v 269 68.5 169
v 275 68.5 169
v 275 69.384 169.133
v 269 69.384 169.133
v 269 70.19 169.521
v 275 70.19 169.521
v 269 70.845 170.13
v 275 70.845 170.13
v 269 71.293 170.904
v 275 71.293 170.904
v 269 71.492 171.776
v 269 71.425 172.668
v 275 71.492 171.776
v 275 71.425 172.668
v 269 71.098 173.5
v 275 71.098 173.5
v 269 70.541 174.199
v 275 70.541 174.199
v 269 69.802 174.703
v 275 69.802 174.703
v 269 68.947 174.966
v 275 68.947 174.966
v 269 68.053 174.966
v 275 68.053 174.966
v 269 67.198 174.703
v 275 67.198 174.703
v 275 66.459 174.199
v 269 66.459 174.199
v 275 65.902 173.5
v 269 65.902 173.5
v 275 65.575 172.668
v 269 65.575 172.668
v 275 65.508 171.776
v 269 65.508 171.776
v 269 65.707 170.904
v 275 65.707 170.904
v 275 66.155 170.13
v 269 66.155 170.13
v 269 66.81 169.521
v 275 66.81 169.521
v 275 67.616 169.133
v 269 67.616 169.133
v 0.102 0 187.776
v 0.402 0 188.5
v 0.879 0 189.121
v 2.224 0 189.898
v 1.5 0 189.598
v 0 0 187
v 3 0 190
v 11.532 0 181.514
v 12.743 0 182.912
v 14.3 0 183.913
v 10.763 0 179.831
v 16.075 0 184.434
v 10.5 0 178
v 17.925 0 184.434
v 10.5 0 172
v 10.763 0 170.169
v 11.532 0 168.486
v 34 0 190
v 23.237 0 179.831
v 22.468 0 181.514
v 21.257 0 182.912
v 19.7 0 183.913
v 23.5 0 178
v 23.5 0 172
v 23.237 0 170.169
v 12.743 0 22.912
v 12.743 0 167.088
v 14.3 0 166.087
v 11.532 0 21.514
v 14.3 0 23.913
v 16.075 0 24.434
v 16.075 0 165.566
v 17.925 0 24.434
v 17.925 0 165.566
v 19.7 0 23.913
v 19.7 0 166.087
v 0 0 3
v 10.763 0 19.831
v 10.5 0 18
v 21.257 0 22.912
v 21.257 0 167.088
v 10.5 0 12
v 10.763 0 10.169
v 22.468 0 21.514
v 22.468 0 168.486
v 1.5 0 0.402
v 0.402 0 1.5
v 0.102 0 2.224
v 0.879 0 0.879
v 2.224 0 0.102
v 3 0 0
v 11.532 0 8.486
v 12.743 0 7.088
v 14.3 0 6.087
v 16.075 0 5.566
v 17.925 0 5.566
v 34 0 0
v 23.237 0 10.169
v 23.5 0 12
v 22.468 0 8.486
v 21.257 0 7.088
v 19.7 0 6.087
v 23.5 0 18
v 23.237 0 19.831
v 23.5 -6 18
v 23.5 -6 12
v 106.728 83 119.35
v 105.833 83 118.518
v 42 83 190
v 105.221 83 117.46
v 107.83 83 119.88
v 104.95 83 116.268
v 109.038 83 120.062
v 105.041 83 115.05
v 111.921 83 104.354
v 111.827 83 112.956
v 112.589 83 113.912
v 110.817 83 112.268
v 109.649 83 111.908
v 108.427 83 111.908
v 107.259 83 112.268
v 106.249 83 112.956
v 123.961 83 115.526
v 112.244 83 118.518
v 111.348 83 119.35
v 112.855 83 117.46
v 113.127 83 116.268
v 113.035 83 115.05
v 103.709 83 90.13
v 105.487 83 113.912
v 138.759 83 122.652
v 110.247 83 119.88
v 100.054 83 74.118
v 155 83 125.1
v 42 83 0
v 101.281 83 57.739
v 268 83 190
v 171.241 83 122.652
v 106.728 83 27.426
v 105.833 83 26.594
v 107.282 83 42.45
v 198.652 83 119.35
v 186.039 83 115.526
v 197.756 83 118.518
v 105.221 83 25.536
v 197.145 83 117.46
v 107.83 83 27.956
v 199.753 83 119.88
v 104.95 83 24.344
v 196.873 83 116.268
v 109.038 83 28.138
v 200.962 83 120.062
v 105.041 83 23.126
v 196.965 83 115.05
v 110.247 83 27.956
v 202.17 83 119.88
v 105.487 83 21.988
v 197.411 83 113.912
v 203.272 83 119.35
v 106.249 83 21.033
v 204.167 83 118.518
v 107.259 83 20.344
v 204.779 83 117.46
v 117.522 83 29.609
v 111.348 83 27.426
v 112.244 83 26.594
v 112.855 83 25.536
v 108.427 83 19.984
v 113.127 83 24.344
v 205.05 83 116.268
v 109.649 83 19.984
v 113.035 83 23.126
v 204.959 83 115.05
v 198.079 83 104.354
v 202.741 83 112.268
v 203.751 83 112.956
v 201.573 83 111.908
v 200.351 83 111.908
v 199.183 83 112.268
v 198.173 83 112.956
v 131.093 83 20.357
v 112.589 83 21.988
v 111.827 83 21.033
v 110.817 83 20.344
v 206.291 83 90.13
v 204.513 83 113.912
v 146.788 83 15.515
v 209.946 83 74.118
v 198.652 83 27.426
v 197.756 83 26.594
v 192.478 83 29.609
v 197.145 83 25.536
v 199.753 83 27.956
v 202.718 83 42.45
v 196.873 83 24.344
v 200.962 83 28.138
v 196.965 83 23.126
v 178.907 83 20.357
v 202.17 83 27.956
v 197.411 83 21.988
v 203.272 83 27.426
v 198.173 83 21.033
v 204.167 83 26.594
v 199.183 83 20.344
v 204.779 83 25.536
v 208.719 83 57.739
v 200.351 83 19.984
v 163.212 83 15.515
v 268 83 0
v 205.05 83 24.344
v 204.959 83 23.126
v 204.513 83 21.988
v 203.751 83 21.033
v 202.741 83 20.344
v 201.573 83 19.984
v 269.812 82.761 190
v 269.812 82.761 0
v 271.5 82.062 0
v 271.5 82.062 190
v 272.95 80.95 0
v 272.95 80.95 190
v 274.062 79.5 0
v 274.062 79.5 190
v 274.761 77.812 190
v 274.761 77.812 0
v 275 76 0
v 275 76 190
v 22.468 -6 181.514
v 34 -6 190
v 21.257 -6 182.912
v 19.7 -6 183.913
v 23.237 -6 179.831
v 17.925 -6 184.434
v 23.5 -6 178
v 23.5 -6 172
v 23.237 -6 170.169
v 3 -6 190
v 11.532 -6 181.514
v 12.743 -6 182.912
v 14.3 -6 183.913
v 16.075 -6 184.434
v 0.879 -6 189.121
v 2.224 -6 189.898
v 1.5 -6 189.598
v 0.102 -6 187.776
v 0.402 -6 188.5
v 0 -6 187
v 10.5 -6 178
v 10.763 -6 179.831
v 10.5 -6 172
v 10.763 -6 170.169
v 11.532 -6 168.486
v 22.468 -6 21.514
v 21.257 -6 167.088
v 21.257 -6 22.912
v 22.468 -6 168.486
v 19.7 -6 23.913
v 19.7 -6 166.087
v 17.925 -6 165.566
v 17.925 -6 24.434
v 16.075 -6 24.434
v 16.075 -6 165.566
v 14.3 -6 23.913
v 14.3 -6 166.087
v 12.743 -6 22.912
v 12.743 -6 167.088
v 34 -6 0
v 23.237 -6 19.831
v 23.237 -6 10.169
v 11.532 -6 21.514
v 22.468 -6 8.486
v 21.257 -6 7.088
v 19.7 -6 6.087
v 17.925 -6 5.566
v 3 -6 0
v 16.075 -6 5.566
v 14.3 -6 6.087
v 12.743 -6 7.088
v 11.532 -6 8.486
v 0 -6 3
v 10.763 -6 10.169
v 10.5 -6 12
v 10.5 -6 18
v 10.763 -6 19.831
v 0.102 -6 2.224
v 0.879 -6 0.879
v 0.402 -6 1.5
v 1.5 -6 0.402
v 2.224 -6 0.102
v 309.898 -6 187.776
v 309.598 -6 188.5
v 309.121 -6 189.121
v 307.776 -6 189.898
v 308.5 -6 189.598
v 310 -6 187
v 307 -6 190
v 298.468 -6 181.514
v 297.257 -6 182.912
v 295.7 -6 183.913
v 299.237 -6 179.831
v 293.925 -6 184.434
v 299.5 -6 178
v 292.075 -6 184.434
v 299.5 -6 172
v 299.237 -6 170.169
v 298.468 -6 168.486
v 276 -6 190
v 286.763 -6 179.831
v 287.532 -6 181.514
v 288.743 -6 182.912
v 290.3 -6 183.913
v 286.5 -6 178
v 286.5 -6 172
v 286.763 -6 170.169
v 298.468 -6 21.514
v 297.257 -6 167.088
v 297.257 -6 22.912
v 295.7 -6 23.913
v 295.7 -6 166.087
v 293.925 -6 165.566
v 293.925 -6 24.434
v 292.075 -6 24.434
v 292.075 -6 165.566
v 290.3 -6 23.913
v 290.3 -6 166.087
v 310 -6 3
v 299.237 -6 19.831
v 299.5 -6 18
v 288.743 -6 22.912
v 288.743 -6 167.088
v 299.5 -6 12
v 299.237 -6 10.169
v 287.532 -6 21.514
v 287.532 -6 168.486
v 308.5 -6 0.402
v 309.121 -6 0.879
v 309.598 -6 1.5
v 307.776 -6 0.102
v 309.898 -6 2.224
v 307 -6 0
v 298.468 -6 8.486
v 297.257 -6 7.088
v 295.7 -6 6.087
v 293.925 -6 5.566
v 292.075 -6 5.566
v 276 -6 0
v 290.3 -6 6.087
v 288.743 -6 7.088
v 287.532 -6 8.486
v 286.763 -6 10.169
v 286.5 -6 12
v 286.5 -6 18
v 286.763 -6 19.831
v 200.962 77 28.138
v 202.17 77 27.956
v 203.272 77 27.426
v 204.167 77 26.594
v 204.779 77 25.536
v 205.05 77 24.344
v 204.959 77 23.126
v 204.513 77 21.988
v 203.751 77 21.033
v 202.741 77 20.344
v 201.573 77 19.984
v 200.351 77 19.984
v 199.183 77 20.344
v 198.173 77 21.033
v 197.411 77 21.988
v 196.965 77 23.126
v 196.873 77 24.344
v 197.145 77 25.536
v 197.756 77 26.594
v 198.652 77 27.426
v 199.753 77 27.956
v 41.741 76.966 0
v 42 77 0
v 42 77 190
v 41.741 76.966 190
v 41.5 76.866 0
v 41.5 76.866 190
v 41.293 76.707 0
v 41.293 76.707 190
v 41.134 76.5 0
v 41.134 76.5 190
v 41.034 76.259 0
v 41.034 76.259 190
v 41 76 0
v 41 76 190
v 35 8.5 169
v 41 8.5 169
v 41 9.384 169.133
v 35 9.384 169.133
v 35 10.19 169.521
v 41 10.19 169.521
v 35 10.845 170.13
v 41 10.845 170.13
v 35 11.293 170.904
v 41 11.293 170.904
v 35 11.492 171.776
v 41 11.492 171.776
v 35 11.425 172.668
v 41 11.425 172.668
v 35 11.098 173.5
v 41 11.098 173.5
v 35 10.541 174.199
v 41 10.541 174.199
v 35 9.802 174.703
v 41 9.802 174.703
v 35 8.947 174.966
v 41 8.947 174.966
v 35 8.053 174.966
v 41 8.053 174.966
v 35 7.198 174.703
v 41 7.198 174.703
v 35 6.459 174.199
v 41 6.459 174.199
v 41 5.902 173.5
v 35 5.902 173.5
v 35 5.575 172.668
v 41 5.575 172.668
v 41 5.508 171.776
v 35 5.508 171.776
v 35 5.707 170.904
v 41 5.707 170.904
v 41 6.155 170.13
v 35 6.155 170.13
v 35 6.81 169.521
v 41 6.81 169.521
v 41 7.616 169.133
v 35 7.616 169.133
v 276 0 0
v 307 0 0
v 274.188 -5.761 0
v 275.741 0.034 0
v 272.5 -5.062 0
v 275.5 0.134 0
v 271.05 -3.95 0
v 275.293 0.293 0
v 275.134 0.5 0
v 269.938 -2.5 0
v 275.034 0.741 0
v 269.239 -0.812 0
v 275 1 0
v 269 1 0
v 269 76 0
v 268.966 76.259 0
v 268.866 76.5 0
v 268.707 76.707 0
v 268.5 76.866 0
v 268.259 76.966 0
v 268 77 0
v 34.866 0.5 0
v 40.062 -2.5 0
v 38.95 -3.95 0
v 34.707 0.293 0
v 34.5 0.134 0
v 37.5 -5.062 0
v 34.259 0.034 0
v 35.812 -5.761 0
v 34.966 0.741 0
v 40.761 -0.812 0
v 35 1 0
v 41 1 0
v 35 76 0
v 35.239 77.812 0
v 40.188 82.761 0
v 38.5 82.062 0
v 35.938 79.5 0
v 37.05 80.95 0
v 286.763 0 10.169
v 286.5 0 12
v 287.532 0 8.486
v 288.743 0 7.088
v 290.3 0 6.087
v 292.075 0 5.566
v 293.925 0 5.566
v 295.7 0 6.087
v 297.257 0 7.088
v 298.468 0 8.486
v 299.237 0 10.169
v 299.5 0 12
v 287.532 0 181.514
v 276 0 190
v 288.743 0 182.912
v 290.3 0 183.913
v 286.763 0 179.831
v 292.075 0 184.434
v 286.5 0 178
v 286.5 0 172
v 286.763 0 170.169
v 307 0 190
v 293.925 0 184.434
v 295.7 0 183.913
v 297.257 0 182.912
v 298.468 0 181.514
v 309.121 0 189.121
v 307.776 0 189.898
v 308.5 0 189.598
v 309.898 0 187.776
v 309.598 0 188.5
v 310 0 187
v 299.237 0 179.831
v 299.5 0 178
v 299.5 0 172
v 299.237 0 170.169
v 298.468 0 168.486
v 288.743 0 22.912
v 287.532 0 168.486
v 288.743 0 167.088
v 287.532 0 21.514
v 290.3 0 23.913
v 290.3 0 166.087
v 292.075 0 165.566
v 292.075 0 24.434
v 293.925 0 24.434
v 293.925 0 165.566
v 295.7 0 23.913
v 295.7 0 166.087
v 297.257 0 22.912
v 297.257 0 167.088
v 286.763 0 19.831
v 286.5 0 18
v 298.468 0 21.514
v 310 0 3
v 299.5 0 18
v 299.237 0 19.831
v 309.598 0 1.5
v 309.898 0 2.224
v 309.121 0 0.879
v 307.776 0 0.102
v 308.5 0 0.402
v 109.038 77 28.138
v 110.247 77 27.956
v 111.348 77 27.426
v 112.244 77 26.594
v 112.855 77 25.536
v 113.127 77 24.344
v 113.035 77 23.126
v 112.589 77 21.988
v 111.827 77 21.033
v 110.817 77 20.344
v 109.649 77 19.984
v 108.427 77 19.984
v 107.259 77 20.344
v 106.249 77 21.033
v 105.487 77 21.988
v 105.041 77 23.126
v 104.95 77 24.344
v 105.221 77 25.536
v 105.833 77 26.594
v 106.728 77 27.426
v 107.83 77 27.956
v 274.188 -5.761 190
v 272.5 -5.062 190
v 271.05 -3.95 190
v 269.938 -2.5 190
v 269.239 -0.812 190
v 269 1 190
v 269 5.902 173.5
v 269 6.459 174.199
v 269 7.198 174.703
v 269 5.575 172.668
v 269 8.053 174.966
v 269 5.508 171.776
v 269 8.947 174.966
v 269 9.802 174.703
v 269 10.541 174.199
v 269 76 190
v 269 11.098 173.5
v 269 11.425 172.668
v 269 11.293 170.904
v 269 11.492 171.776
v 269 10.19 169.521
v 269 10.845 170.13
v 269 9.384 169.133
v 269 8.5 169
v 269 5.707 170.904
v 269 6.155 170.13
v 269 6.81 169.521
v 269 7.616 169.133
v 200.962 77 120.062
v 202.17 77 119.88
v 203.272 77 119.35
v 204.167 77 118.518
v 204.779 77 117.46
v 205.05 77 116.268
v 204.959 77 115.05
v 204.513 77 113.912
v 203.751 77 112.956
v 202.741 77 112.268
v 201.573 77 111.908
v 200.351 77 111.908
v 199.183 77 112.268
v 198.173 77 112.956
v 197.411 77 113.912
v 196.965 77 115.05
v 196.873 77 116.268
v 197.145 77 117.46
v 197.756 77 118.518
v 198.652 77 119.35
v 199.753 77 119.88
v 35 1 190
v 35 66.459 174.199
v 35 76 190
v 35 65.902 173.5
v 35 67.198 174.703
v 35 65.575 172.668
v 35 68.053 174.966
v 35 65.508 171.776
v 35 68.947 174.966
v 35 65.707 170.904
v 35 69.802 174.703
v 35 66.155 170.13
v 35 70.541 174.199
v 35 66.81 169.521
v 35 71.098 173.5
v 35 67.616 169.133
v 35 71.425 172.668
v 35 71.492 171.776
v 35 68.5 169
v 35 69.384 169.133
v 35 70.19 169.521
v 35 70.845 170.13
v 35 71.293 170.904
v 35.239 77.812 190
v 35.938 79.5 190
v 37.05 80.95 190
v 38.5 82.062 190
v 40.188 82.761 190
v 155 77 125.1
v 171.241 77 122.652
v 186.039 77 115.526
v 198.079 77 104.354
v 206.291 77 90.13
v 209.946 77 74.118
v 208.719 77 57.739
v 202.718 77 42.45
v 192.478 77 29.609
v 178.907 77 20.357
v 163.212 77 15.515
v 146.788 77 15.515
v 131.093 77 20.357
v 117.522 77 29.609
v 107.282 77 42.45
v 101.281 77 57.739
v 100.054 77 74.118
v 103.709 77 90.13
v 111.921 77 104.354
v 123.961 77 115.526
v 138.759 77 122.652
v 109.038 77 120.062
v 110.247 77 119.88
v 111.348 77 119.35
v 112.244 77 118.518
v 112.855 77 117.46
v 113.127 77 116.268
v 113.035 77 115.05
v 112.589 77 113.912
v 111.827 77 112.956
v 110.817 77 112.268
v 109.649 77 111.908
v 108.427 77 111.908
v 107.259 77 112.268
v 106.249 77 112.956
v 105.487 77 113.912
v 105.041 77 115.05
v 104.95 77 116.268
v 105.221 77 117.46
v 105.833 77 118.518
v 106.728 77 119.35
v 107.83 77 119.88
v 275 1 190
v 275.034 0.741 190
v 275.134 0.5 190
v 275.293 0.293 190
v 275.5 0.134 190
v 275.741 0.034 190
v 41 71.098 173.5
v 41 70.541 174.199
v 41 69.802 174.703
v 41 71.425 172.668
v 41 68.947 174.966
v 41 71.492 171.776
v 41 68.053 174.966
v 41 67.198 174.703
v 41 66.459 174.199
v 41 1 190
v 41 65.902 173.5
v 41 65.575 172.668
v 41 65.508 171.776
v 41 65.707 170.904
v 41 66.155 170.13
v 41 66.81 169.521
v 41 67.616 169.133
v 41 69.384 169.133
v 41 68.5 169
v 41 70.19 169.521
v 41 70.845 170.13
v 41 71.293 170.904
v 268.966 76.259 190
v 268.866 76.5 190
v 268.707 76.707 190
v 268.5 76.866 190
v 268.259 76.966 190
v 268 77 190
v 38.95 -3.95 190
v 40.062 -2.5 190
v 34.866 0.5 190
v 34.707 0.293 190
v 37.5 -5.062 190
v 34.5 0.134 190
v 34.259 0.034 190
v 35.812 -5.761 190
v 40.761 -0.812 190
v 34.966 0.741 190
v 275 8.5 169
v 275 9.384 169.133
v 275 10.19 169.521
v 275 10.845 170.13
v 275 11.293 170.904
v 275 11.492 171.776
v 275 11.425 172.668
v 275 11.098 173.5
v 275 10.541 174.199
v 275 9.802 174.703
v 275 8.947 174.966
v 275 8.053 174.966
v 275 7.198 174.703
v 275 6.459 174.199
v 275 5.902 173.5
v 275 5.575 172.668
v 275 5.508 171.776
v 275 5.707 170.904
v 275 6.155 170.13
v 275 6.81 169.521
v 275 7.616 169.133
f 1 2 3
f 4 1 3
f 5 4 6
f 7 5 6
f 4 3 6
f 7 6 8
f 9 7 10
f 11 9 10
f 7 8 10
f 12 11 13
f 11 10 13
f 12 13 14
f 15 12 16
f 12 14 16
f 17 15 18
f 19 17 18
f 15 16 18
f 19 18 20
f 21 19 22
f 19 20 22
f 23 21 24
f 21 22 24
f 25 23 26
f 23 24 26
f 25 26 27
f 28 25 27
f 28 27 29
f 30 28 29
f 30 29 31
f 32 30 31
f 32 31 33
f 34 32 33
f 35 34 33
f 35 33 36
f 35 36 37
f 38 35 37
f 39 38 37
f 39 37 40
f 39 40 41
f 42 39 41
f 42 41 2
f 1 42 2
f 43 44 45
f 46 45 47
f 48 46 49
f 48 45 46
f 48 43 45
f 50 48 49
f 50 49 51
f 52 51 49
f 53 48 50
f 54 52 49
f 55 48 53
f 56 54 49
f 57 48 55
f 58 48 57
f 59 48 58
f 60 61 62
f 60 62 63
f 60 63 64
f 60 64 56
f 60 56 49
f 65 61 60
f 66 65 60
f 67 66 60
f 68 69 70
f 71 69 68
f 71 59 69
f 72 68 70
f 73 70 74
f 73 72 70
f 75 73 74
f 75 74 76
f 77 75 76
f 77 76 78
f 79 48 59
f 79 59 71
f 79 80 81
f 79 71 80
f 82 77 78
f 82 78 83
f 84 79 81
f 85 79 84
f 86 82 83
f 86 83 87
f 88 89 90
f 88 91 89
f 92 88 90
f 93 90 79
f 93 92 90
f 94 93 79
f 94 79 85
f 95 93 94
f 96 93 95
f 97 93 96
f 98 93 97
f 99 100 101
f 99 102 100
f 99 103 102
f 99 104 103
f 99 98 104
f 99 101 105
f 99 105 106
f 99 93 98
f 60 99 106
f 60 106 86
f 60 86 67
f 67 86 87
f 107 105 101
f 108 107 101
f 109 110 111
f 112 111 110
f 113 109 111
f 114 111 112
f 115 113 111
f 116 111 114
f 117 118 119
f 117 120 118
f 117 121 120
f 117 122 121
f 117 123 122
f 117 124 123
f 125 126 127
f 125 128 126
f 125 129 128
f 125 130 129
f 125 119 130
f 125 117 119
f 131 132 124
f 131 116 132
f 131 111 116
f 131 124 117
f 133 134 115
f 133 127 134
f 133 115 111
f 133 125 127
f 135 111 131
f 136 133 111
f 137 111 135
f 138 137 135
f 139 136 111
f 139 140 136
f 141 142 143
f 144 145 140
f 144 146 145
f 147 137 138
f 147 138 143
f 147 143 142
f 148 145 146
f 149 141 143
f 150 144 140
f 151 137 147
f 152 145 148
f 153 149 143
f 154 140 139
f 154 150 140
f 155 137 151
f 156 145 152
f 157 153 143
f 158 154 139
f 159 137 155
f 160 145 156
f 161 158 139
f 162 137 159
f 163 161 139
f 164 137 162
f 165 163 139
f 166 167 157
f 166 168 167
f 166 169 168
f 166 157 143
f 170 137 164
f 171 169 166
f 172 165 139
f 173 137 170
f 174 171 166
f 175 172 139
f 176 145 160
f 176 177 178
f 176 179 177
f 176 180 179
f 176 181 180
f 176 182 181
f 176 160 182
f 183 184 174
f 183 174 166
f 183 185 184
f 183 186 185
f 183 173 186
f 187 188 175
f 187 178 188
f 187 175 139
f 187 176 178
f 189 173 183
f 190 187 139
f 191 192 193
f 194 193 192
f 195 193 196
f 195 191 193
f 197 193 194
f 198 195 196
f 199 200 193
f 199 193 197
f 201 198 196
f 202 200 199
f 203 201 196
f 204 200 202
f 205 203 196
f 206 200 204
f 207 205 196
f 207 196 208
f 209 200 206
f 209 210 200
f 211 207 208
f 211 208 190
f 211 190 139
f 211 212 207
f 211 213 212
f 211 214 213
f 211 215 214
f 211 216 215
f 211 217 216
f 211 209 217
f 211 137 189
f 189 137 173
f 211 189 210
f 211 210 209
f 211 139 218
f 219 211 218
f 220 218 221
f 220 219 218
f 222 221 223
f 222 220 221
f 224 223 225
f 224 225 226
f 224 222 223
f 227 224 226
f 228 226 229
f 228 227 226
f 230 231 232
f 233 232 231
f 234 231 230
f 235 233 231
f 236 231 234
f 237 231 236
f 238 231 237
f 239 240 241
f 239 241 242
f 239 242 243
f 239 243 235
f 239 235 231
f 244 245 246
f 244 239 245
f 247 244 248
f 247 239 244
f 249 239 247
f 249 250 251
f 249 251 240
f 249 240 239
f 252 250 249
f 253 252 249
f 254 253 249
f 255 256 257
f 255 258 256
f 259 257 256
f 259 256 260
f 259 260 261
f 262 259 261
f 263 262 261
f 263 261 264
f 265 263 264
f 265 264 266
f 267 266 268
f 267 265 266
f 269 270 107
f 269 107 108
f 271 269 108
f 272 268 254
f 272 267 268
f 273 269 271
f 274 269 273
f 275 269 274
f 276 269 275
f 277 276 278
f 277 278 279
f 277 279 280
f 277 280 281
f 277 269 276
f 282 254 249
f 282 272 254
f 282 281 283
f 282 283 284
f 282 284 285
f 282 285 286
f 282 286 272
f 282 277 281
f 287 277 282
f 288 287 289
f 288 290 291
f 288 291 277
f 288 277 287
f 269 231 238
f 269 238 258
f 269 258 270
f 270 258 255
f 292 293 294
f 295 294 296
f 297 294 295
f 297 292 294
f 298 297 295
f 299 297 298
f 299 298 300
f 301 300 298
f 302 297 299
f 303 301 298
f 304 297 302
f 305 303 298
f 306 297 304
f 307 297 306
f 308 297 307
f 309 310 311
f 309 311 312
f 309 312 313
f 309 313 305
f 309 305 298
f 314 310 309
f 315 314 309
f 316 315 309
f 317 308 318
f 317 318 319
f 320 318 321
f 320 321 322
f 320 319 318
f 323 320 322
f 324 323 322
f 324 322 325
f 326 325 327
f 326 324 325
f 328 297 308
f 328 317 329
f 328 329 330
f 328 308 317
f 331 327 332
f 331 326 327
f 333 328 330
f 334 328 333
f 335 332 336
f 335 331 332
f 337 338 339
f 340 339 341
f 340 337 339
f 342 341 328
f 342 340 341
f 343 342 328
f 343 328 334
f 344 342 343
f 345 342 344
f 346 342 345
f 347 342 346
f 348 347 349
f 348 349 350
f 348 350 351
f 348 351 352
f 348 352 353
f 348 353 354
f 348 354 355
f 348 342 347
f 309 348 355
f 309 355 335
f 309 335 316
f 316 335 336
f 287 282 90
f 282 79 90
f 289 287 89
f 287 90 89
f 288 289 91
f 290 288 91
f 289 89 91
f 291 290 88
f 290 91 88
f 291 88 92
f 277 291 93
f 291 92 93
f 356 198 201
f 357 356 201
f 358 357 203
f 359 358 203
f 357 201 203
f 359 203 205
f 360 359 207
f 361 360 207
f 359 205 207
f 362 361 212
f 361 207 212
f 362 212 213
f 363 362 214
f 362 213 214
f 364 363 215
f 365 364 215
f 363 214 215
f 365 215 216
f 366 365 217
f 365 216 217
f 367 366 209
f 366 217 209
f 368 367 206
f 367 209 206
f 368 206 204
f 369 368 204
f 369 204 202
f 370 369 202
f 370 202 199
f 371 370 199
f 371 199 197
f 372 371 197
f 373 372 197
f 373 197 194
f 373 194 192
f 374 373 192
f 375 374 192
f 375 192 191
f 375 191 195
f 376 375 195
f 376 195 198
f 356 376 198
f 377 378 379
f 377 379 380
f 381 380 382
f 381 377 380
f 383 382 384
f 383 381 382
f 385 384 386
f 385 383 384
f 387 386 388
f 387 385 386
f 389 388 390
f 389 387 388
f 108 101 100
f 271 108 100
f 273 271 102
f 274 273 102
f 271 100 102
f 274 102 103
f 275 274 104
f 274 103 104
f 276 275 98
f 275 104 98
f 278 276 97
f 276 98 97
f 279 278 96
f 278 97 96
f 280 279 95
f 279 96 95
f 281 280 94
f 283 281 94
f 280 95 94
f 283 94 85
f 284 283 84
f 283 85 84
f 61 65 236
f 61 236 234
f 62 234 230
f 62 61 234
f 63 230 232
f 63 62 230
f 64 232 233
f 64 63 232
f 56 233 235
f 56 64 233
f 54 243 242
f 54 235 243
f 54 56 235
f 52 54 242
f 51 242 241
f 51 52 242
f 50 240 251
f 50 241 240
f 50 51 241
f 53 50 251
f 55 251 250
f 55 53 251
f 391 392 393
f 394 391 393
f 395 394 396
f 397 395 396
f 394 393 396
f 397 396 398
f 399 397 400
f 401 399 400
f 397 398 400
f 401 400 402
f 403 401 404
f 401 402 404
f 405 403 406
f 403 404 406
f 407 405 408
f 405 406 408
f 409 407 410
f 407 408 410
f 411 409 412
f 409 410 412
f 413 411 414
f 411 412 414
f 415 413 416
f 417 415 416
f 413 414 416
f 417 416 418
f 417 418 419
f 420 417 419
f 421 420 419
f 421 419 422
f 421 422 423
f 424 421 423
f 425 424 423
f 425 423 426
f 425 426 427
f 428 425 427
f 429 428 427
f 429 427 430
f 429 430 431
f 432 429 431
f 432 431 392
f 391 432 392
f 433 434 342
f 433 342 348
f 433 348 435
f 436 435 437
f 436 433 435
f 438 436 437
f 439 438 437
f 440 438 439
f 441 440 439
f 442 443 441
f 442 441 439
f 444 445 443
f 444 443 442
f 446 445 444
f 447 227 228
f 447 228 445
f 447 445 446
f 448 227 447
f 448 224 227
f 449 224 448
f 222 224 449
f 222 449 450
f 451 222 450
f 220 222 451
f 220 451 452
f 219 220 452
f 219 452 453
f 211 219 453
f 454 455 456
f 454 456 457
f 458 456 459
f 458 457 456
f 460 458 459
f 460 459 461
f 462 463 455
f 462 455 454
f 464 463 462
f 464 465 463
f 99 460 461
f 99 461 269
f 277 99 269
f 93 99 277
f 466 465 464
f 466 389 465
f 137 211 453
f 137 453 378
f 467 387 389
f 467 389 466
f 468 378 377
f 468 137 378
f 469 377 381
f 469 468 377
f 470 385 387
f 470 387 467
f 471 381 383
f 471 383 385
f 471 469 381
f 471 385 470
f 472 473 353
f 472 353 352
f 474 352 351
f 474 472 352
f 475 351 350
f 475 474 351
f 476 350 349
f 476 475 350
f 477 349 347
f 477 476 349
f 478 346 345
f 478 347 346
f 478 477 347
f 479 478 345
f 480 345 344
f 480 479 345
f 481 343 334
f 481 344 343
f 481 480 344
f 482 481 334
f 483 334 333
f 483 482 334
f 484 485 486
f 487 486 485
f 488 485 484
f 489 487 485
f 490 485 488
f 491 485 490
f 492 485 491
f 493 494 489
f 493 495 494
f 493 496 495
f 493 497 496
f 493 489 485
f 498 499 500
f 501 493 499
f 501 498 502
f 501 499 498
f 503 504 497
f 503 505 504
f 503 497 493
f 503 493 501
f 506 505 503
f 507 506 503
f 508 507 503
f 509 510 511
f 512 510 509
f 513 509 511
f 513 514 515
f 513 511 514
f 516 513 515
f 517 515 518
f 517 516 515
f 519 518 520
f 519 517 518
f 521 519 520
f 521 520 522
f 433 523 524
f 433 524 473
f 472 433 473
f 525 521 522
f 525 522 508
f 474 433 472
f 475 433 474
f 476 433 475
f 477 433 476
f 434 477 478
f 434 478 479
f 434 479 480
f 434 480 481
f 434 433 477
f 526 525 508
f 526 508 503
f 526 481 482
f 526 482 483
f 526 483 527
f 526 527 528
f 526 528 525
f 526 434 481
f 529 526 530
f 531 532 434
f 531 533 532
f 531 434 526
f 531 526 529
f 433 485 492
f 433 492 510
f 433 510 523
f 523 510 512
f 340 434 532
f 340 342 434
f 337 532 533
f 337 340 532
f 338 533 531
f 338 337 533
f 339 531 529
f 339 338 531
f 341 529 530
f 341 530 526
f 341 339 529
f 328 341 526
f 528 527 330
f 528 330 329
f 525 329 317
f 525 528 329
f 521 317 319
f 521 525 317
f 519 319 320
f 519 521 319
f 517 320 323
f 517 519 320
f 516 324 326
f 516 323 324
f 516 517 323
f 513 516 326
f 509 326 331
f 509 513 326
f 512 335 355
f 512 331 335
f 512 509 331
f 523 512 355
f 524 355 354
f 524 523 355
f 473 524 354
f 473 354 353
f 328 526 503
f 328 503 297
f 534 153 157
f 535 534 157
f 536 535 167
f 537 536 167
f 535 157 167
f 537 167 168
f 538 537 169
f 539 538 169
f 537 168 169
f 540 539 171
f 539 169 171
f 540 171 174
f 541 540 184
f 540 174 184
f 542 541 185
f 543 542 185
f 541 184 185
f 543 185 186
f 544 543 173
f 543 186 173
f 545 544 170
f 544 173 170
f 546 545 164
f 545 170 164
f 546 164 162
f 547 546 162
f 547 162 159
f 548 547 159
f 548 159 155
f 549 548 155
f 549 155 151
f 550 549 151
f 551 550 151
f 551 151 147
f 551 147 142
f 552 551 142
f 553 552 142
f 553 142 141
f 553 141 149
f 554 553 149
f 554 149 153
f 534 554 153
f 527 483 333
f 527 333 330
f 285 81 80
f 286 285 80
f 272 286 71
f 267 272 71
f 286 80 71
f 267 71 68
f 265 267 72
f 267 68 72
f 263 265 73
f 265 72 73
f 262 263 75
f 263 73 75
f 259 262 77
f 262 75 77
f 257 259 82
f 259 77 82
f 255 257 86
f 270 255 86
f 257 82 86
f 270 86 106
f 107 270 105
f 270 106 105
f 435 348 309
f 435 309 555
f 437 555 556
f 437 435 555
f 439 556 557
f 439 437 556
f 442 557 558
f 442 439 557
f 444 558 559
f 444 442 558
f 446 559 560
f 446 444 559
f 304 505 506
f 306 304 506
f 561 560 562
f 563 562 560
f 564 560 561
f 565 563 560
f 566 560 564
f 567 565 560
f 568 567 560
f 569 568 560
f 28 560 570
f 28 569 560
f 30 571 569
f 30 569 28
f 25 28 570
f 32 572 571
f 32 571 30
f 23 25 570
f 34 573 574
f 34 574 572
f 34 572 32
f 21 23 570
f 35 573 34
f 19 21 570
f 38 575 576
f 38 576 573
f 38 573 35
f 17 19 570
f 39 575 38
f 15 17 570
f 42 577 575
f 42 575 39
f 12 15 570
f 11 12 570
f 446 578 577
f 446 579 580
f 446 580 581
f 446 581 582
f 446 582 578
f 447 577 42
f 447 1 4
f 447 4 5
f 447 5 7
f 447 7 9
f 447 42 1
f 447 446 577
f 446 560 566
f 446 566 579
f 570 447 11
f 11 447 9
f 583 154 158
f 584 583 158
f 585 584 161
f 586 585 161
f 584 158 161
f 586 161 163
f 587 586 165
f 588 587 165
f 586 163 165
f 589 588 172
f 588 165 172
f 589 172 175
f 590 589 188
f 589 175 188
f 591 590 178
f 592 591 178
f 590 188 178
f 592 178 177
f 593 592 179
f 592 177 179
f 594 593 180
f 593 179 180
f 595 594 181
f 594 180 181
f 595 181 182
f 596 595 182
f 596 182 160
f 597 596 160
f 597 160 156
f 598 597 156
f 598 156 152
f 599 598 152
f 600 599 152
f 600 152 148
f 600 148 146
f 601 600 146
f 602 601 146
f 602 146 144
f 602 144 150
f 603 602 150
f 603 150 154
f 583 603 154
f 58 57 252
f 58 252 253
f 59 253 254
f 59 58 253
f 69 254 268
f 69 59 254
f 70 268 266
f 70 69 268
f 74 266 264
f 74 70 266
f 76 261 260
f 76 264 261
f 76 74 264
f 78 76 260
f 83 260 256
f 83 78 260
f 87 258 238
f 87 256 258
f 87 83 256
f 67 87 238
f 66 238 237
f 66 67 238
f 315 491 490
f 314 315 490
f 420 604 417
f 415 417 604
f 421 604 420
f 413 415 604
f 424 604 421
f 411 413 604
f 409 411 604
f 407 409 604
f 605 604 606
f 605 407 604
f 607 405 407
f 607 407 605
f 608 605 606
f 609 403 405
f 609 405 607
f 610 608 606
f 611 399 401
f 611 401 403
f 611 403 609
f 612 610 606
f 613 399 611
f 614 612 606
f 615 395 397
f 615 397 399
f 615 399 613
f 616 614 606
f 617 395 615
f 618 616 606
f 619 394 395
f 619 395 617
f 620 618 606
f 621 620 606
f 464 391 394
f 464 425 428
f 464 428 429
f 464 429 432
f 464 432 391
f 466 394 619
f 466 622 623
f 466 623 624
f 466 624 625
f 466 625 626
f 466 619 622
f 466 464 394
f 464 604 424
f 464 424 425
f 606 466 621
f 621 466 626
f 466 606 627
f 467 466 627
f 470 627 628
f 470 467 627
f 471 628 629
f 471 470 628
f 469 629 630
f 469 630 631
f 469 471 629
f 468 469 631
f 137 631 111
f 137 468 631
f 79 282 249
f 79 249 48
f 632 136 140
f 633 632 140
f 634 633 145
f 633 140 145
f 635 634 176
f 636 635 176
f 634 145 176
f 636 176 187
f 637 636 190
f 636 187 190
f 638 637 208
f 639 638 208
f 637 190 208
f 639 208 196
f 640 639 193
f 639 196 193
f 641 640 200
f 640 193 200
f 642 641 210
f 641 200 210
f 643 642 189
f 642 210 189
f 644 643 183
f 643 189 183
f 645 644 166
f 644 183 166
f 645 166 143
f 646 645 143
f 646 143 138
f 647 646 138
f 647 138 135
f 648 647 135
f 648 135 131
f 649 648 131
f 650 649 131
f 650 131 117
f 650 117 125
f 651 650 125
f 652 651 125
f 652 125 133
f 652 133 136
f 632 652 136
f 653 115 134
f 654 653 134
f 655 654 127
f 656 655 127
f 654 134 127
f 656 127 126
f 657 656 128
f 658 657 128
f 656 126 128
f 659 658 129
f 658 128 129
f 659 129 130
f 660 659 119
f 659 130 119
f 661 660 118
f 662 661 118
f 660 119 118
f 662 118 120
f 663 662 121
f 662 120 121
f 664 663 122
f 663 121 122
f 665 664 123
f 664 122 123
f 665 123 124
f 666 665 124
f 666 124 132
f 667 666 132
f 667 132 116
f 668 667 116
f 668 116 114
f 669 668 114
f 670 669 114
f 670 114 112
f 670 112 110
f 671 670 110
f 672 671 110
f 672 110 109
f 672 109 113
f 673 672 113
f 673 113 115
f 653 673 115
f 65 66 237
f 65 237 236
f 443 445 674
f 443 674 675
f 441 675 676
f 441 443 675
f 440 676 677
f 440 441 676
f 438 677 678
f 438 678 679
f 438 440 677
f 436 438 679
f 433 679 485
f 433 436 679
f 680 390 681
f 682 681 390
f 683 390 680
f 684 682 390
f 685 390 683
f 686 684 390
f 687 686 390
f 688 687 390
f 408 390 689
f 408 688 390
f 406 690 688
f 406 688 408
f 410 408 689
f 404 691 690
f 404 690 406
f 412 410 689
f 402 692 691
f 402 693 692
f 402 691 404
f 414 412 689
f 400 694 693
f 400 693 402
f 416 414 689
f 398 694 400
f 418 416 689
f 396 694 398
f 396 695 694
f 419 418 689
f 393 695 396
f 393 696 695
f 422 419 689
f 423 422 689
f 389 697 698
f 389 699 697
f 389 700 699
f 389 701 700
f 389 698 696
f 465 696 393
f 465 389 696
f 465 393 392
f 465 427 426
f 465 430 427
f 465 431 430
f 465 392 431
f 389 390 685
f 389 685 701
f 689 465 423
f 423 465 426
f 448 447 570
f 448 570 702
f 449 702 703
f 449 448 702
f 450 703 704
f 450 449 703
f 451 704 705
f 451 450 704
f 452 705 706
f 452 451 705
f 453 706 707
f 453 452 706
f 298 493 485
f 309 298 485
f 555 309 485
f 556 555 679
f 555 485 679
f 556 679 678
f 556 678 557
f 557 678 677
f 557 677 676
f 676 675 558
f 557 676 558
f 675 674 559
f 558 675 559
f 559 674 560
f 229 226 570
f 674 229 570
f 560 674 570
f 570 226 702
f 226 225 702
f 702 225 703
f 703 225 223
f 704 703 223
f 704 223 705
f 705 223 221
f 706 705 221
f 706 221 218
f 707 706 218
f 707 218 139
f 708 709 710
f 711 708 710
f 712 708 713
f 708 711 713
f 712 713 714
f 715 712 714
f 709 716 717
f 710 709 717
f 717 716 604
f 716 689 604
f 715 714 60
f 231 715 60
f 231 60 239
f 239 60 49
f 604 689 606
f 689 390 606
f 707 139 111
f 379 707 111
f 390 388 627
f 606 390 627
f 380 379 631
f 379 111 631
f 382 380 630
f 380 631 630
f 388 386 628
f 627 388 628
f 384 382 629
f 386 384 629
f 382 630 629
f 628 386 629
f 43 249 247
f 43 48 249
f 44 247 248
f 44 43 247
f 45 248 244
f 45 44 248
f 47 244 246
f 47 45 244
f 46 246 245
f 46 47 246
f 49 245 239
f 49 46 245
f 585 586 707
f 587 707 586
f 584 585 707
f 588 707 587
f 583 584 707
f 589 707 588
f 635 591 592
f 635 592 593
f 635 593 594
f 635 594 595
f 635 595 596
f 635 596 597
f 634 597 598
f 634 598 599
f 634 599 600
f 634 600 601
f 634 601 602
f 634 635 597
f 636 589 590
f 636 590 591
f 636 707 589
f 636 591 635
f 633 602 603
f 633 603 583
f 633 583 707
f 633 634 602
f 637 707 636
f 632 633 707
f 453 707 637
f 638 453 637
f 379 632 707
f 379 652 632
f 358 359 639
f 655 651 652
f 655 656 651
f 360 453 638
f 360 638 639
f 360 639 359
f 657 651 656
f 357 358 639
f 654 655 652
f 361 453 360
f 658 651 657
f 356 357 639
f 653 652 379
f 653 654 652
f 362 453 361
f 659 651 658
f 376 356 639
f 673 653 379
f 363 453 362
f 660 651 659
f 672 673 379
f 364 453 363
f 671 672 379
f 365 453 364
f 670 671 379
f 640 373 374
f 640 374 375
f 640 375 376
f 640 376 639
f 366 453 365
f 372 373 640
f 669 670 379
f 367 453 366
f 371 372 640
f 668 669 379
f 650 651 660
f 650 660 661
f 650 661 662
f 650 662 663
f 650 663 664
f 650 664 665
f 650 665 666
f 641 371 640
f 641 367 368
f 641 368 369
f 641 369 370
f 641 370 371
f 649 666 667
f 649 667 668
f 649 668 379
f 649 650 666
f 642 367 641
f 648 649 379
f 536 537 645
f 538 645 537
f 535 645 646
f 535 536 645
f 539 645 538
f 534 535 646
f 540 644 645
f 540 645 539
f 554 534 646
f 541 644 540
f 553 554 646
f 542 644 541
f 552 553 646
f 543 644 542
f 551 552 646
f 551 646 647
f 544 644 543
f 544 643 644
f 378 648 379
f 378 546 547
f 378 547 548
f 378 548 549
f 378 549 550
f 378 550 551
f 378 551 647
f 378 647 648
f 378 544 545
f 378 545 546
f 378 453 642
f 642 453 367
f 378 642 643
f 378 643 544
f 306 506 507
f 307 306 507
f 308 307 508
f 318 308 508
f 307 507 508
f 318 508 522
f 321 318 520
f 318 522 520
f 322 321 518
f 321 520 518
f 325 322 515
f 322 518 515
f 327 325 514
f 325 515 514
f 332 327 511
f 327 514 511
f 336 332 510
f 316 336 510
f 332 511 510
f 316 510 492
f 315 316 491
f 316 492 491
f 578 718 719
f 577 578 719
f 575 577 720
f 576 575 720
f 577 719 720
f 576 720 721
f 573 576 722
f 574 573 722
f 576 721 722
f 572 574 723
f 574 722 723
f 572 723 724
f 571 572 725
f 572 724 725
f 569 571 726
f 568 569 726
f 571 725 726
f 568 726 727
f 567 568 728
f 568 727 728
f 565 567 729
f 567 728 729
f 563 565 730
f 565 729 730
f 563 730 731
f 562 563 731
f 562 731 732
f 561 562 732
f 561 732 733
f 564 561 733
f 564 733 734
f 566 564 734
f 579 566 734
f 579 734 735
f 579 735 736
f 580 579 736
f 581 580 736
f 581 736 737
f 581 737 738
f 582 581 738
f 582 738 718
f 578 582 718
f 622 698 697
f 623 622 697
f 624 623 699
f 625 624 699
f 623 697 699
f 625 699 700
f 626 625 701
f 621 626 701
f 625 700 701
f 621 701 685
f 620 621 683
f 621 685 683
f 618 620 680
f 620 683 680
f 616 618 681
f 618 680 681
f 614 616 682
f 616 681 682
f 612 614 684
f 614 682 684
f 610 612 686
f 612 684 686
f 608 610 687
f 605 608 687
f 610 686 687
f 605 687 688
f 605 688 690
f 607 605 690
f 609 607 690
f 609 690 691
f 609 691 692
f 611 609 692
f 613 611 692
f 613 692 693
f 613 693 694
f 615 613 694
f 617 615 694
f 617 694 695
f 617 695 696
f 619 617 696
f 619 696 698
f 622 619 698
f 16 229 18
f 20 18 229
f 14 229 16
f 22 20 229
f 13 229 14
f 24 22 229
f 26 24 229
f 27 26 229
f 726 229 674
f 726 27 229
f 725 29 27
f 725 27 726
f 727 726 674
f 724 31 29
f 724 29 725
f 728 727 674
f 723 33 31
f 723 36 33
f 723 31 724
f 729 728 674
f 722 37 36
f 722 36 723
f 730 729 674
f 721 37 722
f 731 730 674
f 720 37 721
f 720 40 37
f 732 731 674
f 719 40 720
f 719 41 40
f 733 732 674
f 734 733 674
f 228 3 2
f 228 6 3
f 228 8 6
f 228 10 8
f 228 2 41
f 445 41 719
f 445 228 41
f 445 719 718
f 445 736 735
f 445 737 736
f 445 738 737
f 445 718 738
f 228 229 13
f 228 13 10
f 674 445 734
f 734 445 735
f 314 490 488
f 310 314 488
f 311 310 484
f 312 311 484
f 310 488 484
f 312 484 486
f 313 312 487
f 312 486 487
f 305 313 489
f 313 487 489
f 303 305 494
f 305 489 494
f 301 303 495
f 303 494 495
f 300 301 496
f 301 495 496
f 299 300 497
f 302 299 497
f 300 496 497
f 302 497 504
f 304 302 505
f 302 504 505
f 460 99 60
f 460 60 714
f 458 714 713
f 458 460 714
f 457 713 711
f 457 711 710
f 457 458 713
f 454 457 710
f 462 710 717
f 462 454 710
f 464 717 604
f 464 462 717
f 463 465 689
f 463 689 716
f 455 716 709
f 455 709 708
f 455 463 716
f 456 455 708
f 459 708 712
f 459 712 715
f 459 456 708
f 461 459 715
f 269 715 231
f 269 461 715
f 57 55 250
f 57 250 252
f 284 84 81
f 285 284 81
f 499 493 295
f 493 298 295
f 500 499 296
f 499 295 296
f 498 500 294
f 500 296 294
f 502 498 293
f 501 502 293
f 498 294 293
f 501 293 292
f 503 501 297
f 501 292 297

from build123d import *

# Parameters (mm, degrees)
BASE_FLANGE1_DEPTH = 190
CUT_EXTRUDE1_REACH = 376.327
SKETCH6_R          = 55.1
SKETCH6_R_2        = 4.1
CUT_EXTRUDE2_REACH = 374.946
FILLET1_R          = 3
CUT_EXTRUDE3_REACH = 346.404
SKETCH8_R          = 3


# Sheet-metal steps are written as plain solids
with BuildPart() as part:
    # Sketch1 → Base-Flange1 (new body)
    with BuildSketch(Plane.XY):
        with BuildLine():
            Line((0, 0), (34, 0))
            ThreePointArc((34, 0), (34.707106781, 0.292893219), (35, 1))
            Line((35, 1), (35, 76))
            ThreePointArc((35, 76), (37.050252532, 80.949747468), (42, 83))
            Line((42, 83), (268, 83))
            ThreePointArc((268, 83), (272.949747468, 80.949747468), (275, 76))
            Line((275, 76), (275, 1))
            ThreePointArc((275, 1), (275.292893219, 0.292893219), (276, 0))
            Line((276, 0), (310, 0))
            Line((310, 0), (310, -6))
            Line((310, -6), (276, -6))
            ThreePointArc((276, -6), (271.050252532, -3.949747468), (269, 1))
            Line((269, 1), (269, 76))
            ThreePointArc((269, 76), (268.707106781, 76.707106781), (268, 77))
            Line((268, 77), (42, 77))
            ThreePointArc((42, 77), (41.292893219, 76.707106781), (41, 76))
            Line((41, 76), (41, 1))
            ThreePointArc((41, 1), (38.949747468, -3.949747468), (34, -6))
            Line((34, -6), (0, -6))
            Line((0, -6), (0, 0))
        make_face()
    extrude(amount=BASE_FLANGE1_DEPTH)

    # Sketch6 → Cut-Extrude1 (cut, up to next)
    with BuildSketch(Plane(origin=(0, 83, 0), x_dir=(1, 0, 0), z_dir=(0, 1, 0)), mode=Mode.PRIVATE) as cut_extrude1_sk1:
        with Locations(Location((155, -70, 0), (0, 0, 270))):
            Circle(SKETCH6_R)
    cut_extrude1_tool1 = extrude(cut_extrude1_sk1.sketch, amount=-CUT_EXTRUDE1_REACH, mode=Mode.PRIVATE) & part.part
    # Sketch6 → Cut-Extrude1 (cut, up to next)
    with BuildSketch(Plane(origin=(0, 83, 0), x_dir=(1, 0, 0), z_dir=(0, 1, 0)), mode=Mode.PRIVATE) as cut_extrude1_sk2:
        with Locations(Location((200.961940777, -24.038059223, 0), (0, 0, 270))):
            Circle(SKETCH6_R_2)
    cut_extrude1_tool2 = extrude(cut_extrude1_sk2.sketch, amount=-CUT_EXTRUDE1_REACH, mode=Mode.PRIVATE) & part.part
    # Sketch6 → Cut-Extrude1 (cut, up to next)
    with BuildSketch(Plane(origin=(0, 83, 0), x_dir=(1, 0, 0), z_dir=(0, 1, 0)), mode=Mode.PRIVATE) as cut_extrude1_sk3:
        with Locations(Location((200.961940777, -115.961940777, 0), (0, 0, 270))):
            Circle(SKETCH6_R_2)
    cut_extrude1_tool3 = extrude(cut_extrude1_sk3.sketch, amount=-CUT_EXTRUDE1_REACH, mode=Mode.PRIVATE) & part.part
    # Sketch6 → Cut-Extrude1 (cut, up to next)
    with BuildSketch(Plane(origin=(0, 83, 0), x_dir=(1, 0, 0), z_dir=(0, 1, 0)), mode=Mode.PRIVATE) as cut_extrude1_sk4:
        with Locations(Location((109.038059223, -24.038059223, 0), (0, 0, 270))):
            Circle(SKETCH6_R_2)
    cut_extrude1_tool4 = extrude(cut_extrude1_sk4.sketch, amount=-CUT_EXTRUDE1_REACH, mode=Mode.PRIVATE) & part.part
    # Sketch6 → Cut-Extrude1 (cut, up to next)
    with BuildSketch(Plane(origin=(0, 83, 0), x_dir=(1, 0, 0), z_dir=(0, 1, 0)), mode=Mode.PRIVATE) as cut_extrude1_sk5:
        with Locations(Location((109.038059223, -115.961940777, 0), (0, 0, 270))):
            Circle(SKETCH6_R_2)
    cut_extrude1_tool5 = extrude(cut_extrude1_sk5.sketch, amount=-CUT_EXTRUDE1_REACH, mode=Mode.PRIVATE) & part.part
    add(cut_extrude1_tool1.solids().sort_by_distance((155, 83, 70))[0], mode=Mode.SUBTRACT)
    add(cut_extrude1_tool2.solids().sort_by_distance((200.961941, 83, 24.038059))[0], mode=Mode.SUBTRACT)
    add(cut_extrude1_tool3.solids().sort_by_distance((200.961941, 83, 115.961941))[0], mode=Mode.SUBTRACT)
    add(cut_extrude1_tool4.solids().sort_by_distance((109.038059, 83, 24.038059))[0], mode=Mode.SUBTRACT)
    add(cut_extrude1_tool5.solids().sort_by_distance((109.038059, 83, 115.961941))[0], mode=Mode.SUBTRACT)

    # Sketch7 → Cut-Extrude2 (cut, up to next)
    with BuildSketch(Plane(origin=(0, 0, 0), x_dir=(1, 0, 0), z_dir=(0, 1, 0)), mode=Mode.PRIVATE) as cut_extrude2_sk1:
        with BuildLine():
            Line((299.5, -12), (299.5, -18))
            ThreePointArc((299.5, -18), (293, -24.5), (286.5, -18))
            Line((286.5, -18), (286.5, -12))
            ThreePointArc((286.5, -12), (293, -5.5), (299.5, -12))
        make_face()
    cut_extrude2_tool1 = extrude(cut_extrude2_sk1.sketch, amount=-CUT_EXTRUDE2_REACH, mode=Mode.PRIVATE) & part.part
    # Sketch7 → Cut-Extrude2 (cut, up to next)
    with BuildSketch(Plane(origin=(0, 0, 0), x_dir=(1, 0, 0), z_dir=(0, 1, 0)), mode=Mode.PRIVATE) as cut_extrude2_sk2:
        with BuildLine():
            Line((299.5, -178), (299.5, -172))
            ThreePointArc((299.5, -172), (293, -165.5), (286.5, -172))
            Line((286.5, -172), (286.5, -178))
            ThreePointArc((286.5, -178), (293, -184.5), (299.5, -178))
        make_face()
    cut_extrude2_tool2 = extrude(cut_extrude2_sk2.sketch, amount=-CUT_EXTRUDE2_REACH, mode=Mode.PRIVATE) & part.part
    # Sketch7 → Cut-Extrude2 (cut, up to next)
    with BuildSketch(Plane(origin=(0, 0, 0), x_dir=(1, 0, 0), z_dir=(0, 1, 0)), mode=Mode.PRIVATE) as cut_extrude2_sk3:
        with BuildLine():
            Line((10.5, -178), (10.5, -172))
            ThreePointArc((10.5, -172), (17, -165.5), (23.5, -172))
            Line((23.5, -172), (23.5, -178))
            ThreePointArc((23.5, -178), (17, -184.5), (10.5, -178))
        make_face()
    cut_extrude2_tool3 = extrude(cut_extrude2_sk3.sketch, amount=-CUT_EXTRUDE2_REACH, mode=Mode.PRIVATE) & part.part
    # Sketch7 → Cut-Extrude2 (cut, up to next)
    with BuildSketch(Plane(origin=(0, 0, 0), x_dir=(1, 0, 0), z_dir=(0, 1, 0)), mode=Mode.PRIVATE) as cut_extrude2_sk4:
        with BuildLine():
            Line((10.5, -12), (10.5, -18))
            ThreePointArc((10.5, -18), (17, -24.5), (23.5, -18))
            Line((23.5, -18), (23.5, -12))
            ThreePointArc((23.5, -12), (17, -5.5), (10.5, -12))
        make_face()
    cut_extrude2_tool4 = extrude(cut_extrude2_sk4.sketch, amount=-CUT_EXTRUDE2_REACH, mode=Mode.PRIVATE) & part.part
    add(cut_extrude2_tool1.solids().sort_by_distance((293, 0, 15))[0], mode=Mode.SUBTRACT)
    add(cut_extrude2_tool2.solids().sort_by_distance((293, 0, 175))[0], mode=Mode.SUBTRACT)
    add(cut_extrude2_tool3.solids().sort_by_distance((17, 0, 175))[0], mode=Mode.SUBTRACT)
    add(cut_extrude2_tool4.solids().sort_by_distance((17, 0, 15))[0], mode=Mode.SUBTRACT)

    # Fillet1
    fillet1_edges = [part.edges().sort_by_distance(p)[0] for p in [
        (0, -3, 0),
        (310, -3, 0),
        (0, -3, 190),
        (310, -3, 190),
    ]]
    fillet(fillet1_edges, radius=FILLET1_R)

    # Cut-Extrude3: up to this face of the body (flat: up to its plane)
    cut_extrude3_end = Plane(part.part.faces().sort_by_distance((35, 38.5, 95))[0])
    # Sketch8 → Cut-Extrude3 (cut, up to the picked face)
    with BuildSketch(Plane(origin=(275, 0, 0), x_dir=(0, 0, -1), z_dir=(1, 0, 0)), mode=Mode.PRIVATE) as cut_extrude3_sk1:
        with Locations((-172, 68.5)):
            Circle(SKETCH8_R)
    cut_extrude3_tool1 = split(extrude(cut_extrude3_sk1.sketch, amount=-CUT_EXTRUDE3_REACH, mode=Mode.PRIVATE), bisect_by=cut_extrude3_end, keep=Keep.BOTH, mode=Mode.PRIVATE)
    # Sketch8 → Cut-Extrude3 (cut, up to the picked face)
    with BuildSketch(Plane(origin=(275, 0, 0), x_dir=(0, 0, -1), z_dir=(1, 0, 0)), mode=Mode.PRIVATE) as cut_extrude3_sk2:
        with Locations((-172, 8.5)):
            Circle(SKETCH8_R)
    cut_extrude3_tool2 = split(extrude(cut_extrude3_sk2.sketch, amount=-CUT_EXTRUDE3_REACH, mode=Mode.PRIVATE), bisect_by=cut_extrude3_end, keep=Keep.BOTH, mode=Mode.PRIVATE)
    add(cut_extrude3_tool1.solids().sort_by(Axis((275, 68.5, 172), (-1, 0, 0)))[0], mode=Mode.SUBTRACT)
    add(cut_extrude3_tool2.solids().sort_by(Axis((275, 8.5, 172), (-1, 0, 0)))[0], mode=Mode.SUBTRACT)


solid = part.part
